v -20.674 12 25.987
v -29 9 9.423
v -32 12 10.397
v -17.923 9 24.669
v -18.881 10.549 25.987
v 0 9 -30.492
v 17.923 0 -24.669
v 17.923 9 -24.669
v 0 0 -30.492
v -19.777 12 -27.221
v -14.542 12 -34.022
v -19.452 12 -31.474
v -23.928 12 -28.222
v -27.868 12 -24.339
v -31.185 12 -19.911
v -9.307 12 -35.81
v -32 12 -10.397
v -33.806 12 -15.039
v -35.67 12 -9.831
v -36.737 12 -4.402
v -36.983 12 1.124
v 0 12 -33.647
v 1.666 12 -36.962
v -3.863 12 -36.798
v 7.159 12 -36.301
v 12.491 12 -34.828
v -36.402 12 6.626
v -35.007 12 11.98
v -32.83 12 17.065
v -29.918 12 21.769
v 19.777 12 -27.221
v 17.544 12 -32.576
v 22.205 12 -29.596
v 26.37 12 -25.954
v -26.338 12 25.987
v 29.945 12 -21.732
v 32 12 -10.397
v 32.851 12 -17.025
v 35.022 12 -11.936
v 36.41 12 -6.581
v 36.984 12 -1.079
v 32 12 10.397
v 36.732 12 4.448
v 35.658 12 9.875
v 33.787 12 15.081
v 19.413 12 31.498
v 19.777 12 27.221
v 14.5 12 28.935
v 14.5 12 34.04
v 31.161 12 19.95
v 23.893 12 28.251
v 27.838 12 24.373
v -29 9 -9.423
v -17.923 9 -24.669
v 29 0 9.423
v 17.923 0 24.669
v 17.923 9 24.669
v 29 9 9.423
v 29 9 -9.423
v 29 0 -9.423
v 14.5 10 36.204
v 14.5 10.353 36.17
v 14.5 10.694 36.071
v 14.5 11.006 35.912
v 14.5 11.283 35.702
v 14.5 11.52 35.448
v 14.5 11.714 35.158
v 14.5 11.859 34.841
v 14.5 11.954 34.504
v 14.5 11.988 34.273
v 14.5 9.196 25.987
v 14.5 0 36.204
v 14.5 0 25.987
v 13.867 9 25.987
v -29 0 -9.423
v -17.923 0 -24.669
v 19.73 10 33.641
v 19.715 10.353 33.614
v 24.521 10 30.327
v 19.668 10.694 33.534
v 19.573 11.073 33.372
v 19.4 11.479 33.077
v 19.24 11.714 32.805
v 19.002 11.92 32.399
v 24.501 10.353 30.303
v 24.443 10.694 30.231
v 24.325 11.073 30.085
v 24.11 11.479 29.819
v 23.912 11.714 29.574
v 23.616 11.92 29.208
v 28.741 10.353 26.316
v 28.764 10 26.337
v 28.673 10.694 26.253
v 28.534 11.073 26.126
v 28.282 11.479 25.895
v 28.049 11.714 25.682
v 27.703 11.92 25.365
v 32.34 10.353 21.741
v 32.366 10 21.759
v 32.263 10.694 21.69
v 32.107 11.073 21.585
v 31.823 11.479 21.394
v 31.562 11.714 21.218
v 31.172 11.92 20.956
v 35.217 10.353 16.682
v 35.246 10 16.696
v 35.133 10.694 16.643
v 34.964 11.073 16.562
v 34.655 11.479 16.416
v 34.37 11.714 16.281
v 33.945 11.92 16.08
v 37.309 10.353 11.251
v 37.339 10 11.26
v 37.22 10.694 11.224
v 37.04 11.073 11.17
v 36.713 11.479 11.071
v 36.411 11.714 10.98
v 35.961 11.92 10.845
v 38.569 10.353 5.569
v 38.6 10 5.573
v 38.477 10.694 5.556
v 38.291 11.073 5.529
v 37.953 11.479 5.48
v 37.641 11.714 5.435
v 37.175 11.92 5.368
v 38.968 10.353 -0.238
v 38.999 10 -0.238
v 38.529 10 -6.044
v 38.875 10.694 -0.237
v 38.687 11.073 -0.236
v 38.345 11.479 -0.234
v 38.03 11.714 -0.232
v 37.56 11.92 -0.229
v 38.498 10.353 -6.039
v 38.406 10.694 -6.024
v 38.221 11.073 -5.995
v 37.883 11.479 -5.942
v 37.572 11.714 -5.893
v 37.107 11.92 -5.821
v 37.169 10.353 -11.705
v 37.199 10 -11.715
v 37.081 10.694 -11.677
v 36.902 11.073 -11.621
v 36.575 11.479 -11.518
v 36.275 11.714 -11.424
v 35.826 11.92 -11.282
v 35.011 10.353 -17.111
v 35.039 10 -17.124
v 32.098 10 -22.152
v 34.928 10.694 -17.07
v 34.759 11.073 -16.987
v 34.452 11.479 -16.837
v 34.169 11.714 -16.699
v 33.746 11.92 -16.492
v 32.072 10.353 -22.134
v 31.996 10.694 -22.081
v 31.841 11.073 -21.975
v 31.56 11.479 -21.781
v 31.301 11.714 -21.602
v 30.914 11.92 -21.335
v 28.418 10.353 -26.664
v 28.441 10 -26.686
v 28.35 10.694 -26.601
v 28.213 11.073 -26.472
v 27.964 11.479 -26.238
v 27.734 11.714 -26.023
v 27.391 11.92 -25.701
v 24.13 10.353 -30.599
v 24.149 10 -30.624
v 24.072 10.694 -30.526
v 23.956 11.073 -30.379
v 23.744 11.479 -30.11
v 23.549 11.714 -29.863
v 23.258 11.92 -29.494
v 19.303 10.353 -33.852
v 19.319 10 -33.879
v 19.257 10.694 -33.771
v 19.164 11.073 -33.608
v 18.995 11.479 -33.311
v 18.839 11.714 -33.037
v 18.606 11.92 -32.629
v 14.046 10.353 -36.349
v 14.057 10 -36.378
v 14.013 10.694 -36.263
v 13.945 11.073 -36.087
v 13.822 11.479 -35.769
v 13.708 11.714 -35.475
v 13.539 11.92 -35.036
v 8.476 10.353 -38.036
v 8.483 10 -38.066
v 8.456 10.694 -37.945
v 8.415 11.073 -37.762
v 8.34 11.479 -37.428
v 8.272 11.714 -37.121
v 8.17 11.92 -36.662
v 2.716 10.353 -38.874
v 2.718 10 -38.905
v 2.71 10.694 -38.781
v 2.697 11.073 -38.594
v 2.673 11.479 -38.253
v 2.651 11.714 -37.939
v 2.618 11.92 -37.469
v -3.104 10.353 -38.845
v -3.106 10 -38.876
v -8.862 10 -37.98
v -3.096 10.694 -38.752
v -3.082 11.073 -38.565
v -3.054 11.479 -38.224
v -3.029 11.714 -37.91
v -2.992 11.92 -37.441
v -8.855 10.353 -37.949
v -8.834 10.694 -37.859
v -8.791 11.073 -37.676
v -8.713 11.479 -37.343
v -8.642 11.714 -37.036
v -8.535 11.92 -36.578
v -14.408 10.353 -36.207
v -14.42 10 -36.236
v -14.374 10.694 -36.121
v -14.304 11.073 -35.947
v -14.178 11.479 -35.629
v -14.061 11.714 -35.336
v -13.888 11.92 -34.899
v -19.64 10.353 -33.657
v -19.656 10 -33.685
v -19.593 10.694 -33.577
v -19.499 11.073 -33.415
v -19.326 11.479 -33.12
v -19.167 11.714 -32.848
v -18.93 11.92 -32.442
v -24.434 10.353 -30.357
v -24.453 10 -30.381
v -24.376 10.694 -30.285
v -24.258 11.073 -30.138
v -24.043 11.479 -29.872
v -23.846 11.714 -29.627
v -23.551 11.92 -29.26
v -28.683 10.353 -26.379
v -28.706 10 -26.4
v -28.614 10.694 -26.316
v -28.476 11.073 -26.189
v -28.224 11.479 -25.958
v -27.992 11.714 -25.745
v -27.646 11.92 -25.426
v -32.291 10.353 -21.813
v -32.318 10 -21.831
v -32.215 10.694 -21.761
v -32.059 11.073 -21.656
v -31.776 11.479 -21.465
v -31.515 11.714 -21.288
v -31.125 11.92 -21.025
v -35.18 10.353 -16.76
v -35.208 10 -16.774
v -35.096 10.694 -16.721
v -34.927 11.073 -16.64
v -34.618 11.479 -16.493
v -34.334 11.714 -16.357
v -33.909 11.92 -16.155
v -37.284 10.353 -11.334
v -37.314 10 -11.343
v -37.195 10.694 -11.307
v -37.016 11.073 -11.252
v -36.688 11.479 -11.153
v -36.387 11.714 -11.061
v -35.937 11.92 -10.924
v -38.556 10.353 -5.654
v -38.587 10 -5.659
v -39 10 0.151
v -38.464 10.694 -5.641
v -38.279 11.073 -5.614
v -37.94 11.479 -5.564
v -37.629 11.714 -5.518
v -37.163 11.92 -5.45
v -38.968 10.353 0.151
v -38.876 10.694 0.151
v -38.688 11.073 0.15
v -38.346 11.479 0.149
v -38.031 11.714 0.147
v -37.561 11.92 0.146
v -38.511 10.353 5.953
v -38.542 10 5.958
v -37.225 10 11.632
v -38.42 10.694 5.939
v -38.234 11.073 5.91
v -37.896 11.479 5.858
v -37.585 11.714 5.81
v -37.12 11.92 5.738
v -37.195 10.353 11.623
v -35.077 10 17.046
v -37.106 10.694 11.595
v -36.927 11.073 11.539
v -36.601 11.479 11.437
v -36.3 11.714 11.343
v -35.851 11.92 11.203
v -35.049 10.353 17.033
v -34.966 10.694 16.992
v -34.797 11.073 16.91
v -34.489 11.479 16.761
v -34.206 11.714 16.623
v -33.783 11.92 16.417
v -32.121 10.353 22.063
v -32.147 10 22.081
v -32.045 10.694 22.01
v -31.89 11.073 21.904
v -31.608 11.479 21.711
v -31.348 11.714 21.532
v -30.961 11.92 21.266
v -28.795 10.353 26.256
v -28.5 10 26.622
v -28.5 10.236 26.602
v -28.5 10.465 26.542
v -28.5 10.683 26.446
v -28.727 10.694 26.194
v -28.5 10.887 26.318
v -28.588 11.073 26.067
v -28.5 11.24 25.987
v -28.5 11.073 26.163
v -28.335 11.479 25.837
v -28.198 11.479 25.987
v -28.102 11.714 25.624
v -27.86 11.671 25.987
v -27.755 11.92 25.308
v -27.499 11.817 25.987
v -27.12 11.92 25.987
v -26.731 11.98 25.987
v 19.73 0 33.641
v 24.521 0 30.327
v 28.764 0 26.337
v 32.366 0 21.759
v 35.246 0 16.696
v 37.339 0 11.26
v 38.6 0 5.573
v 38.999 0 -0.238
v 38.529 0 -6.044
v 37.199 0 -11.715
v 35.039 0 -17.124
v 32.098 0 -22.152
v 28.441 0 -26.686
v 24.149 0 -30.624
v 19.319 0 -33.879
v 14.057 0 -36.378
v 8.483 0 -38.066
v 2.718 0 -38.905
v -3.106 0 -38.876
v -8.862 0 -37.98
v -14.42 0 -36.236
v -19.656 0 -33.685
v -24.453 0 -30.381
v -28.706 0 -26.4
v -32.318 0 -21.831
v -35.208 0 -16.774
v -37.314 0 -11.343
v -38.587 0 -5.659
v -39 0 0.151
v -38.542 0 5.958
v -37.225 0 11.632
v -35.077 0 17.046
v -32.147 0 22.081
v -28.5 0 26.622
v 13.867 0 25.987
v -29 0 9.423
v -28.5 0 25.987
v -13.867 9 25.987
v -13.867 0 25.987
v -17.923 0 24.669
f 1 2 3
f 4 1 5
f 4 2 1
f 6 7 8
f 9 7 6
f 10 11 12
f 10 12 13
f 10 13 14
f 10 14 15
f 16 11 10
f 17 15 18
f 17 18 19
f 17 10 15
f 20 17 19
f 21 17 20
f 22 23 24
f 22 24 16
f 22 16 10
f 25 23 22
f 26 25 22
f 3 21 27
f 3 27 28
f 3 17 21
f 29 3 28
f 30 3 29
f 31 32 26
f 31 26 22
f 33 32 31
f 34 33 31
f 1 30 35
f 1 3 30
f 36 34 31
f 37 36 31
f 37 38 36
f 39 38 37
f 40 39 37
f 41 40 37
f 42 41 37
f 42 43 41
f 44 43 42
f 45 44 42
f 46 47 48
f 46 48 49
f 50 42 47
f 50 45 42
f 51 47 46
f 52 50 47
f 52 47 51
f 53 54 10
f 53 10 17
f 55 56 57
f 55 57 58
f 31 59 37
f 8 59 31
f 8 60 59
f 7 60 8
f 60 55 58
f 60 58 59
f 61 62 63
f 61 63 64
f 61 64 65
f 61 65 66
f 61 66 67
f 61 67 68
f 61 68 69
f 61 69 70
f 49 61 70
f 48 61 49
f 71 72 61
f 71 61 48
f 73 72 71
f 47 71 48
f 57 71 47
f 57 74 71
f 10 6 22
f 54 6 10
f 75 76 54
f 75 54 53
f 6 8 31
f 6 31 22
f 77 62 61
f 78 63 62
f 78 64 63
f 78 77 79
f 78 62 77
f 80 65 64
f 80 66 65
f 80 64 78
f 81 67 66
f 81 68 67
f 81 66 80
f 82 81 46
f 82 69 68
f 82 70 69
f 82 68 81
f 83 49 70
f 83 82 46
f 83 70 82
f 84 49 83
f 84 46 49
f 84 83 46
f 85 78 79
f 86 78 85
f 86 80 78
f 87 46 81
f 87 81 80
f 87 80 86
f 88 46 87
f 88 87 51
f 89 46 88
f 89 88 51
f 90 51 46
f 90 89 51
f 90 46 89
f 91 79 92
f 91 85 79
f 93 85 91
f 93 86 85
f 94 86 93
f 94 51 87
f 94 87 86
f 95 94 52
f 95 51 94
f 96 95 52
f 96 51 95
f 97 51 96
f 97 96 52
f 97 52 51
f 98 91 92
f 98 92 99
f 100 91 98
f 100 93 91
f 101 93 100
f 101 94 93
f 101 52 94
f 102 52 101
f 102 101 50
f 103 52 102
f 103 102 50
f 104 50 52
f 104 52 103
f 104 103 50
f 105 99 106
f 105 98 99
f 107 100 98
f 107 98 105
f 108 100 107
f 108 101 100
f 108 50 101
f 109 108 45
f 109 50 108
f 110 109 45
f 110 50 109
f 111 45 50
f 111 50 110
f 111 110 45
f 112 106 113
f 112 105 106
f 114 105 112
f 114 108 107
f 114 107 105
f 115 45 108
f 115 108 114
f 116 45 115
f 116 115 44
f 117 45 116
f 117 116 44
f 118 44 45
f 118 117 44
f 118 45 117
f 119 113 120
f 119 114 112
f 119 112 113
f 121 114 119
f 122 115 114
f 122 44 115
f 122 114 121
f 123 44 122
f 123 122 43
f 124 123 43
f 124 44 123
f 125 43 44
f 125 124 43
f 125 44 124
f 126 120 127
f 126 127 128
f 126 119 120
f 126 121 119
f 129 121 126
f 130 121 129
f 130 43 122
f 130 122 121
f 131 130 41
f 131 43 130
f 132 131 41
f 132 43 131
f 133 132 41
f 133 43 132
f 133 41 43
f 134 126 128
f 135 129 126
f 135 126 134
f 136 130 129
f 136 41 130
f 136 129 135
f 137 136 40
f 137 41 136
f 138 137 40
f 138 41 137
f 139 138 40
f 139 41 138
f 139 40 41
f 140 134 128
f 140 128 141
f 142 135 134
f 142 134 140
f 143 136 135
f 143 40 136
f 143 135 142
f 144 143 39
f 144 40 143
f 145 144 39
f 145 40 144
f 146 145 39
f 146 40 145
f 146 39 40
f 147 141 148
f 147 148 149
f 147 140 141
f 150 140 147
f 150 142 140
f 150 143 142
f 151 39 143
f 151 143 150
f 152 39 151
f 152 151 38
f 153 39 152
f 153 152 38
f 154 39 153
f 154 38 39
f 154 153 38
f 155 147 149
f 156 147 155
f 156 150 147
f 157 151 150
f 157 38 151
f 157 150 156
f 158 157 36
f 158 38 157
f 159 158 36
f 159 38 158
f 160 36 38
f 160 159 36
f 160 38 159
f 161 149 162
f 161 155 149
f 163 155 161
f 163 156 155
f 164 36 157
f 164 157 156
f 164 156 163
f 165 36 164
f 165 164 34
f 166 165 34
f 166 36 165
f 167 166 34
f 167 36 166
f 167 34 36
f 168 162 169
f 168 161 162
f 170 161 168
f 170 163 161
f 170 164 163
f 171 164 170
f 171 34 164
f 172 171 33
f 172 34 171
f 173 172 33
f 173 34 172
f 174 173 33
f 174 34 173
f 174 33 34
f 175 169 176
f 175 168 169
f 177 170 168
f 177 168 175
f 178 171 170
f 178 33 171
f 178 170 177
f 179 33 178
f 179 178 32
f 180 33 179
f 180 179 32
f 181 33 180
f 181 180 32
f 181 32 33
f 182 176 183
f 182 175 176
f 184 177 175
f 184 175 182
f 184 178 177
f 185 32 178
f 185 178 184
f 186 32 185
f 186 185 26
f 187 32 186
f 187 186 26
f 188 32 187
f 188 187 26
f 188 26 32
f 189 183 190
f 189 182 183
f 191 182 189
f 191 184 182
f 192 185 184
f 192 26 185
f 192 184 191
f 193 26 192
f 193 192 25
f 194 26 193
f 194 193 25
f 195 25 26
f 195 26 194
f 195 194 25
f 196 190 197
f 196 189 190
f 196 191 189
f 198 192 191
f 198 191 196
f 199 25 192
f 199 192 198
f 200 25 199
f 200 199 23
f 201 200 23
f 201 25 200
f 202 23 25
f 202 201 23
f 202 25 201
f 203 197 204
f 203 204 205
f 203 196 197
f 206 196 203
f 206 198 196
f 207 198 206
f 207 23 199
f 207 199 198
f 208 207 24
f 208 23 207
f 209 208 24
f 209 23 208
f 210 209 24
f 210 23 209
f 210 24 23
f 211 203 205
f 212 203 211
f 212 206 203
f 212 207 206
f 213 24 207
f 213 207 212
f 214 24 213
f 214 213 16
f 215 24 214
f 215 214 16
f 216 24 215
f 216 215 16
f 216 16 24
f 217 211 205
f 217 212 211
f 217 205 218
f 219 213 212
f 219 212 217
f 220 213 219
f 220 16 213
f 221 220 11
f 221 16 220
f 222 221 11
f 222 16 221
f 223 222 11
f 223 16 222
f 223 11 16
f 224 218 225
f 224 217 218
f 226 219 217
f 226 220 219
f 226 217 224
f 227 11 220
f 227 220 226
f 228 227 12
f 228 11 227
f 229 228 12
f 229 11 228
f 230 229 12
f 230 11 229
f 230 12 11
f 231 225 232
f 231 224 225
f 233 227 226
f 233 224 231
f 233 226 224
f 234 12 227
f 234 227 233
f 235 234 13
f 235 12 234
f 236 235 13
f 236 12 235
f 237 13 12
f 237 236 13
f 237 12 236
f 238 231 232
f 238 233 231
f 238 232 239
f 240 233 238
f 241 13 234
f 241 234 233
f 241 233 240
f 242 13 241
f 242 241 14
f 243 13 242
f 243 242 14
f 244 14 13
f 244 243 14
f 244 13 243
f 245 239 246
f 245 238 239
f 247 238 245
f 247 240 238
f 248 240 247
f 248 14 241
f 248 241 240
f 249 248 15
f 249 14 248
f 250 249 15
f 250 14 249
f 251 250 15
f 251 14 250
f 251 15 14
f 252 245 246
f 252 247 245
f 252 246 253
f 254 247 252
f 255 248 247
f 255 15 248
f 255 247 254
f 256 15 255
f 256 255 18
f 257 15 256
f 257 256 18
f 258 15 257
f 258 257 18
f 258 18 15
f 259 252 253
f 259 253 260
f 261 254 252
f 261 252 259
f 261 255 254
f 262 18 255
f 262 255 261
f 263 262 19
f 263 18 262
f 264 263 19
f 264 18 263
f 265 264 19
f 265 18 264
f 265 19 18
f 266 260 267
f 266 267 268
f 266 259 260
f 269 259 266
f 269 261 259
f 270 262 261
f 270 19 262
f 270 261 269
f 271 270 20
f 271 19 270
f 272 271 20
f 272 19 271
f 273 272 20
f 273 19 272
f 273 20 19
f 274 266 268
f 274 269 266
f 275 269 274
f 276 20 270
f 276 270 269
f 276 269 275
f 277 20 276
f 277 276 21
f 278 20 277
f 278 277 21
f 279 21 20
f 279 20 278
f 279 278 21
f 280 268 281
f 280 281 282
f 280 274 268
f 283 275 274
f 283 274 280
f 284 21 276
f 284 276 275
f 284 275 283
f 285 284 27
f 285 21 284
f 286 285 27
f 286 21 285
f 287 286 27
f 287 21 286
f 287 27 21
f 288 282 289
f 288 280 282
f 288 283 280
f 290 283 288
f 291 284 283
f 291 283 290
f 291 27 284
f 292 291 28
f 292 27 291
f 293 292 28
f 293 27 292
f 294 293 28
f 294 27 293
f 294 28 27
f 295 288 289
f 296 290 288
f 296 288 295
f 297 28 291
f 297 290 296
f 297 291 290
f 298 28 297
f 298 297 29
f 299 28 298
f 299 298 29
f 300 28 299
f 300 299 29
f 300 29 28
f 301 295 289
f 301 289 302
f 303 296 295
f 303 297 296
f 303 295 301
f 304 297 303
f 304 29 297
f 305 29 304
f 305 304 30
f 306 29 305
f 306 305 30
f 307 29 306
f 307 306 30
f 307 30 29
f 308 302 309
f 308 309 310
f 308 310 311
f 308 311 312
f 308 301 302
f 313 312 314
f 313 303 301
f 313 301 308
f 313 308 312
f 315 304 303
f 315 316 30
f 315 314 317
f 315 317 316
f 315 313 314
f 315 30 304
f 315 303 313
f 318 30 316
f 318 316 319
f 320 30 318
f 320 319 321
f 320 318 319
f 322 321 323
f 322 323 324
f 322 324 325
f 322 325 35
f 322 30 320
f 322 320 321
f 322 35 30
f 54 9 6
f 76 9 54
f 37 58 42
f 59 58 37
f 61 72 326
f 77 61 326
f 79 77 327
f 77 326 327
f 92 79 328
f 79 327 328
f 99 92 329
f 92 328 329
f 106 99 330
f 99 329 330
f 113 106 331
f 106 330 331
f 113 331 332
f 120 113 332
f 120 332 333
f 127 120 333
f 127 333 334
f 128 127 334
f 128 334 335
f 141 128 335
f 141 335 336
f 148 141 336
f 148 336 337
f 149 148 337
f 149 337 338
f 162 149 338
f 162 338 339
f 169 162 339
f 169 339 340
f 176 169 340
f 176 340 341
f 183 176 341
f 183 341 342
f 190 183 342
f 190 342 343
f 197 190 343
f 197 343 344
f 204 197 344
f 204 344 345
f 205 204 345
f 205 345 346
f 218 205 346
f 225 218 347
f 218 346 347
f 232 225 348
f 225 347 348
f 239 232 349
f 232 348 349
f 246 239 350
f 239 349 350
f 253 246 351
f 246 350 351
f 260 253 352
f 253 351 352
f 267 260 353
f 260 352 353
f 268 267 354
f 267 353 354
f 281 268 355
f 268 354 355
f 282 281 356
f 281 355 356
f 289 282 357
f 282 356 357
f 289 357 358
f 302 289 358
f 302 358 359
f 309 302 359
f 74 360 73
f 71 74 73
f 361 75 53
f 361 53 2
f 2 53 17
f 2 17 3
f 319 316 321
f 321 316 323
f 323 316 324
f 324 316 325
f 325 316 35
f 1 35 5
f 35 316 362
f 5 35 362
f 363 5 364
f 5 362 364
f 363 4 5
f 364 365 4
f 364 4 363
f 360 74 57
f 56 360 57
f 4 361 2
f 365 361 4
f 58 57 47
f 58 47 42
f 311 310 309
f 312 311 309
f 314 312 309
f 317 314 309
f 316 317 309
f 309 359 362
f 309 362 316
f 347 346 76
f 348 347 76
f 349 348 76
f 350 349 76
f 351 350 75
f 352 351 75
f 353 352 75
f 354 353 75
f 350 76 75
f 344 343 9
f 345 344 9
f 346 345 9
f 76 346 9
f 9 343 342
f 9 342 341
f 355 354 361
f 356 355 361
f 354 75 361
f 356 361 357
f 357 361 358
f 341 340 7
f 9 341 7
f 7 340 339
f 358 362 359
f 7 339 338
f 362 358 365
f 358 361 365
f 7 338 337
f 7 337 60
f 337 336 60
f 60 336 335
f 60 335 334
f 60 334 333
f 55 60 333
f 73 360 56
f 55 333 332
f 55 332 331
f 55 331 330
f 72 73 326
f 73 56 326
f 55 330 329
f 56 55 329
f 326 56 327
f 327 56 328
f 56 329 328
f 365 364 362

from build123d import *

# Parameters (mm, degrees)
SKETCH1_R           = 39
BOSS_EXTRUDE1_DEPTH = 12
FILLET1_R           = 2
CHAMFER1_SIZE       = 3
SKETCH2_W           = 43
SKETCH2_H           = 43
CUT_EXTRUDE2_DEPTH  = 57.444663167


with BuildPart() as part:
    # Sketch1 → Boss-Extrude1 (new body)
    with BuildSketch(Plane(origin=(0, 0, 0), x_dir=(1, 0, 0), z_dir=(0, 1, 0))):
        with Locations(Location((0, 0, 0), (0, 0, 270))):
            Circle(SKETCH1_R)
        Polygon((17.922985674, 24.668873442), (0, 30.492404503), (-17.922985674, 24.668873442), (-29, 9.422671191), (-29, -9.422671191), (-17.922985674, -24.668873442), (0, -30.492404503), (17.922985674, -24.668873442), (29, -9.422671191), (29, 9.422671191), align=None, mode=Mode.SUBTRACT)
    extrude(amount=BOSS_EXTRUDE1_DEPTH)

    # Fillet1
    fillet1_edges = [part.edges().sort_by_distance(p)[0] for p in [
        (0, 12, -39),
    ]]
    fillet(fillet1_edges, radius=FILLET1_R)

    # Chamfer1
    chamfer1_edges = [part.edges().sort_by_distance(p)[0] for p in [
        (23.461492837, 12, -17.045772316),
        (8.961492837, 12, -27.580638973),
        (-8.961492837, 12, -27.580638973),
        (-23.461492837, 12, -17.045772316),
        (-29, 12, 0),
        (-23.461492837, 12, 17.045772316),
        (-8.961492837, 12, 27.580638973),
        (8.961492837, 12, 27.580638973),
        (23.461492837, 12, 17.045772316),
        (29, 12, 0),
    ]]
    chamfer(chamfer1_edges, length=CHAMFER1_SIZE)

    # Sketch2 → Cut-Extrude2 (cut, through all)
    with BuildSketch(Plane(origin=(0, 0, 0), x_dir=(1, 0, 0), z_dir=(0, 1, 0))):
        with Locations((-7, -47.486840282)):
            Rectangle(SKETCH2_W, SKETCH2_H)
    extrude(amount=CUT_EXTRUDE2_DEPTH, mode=Mode.SUBTRACT)


solid = part.part
